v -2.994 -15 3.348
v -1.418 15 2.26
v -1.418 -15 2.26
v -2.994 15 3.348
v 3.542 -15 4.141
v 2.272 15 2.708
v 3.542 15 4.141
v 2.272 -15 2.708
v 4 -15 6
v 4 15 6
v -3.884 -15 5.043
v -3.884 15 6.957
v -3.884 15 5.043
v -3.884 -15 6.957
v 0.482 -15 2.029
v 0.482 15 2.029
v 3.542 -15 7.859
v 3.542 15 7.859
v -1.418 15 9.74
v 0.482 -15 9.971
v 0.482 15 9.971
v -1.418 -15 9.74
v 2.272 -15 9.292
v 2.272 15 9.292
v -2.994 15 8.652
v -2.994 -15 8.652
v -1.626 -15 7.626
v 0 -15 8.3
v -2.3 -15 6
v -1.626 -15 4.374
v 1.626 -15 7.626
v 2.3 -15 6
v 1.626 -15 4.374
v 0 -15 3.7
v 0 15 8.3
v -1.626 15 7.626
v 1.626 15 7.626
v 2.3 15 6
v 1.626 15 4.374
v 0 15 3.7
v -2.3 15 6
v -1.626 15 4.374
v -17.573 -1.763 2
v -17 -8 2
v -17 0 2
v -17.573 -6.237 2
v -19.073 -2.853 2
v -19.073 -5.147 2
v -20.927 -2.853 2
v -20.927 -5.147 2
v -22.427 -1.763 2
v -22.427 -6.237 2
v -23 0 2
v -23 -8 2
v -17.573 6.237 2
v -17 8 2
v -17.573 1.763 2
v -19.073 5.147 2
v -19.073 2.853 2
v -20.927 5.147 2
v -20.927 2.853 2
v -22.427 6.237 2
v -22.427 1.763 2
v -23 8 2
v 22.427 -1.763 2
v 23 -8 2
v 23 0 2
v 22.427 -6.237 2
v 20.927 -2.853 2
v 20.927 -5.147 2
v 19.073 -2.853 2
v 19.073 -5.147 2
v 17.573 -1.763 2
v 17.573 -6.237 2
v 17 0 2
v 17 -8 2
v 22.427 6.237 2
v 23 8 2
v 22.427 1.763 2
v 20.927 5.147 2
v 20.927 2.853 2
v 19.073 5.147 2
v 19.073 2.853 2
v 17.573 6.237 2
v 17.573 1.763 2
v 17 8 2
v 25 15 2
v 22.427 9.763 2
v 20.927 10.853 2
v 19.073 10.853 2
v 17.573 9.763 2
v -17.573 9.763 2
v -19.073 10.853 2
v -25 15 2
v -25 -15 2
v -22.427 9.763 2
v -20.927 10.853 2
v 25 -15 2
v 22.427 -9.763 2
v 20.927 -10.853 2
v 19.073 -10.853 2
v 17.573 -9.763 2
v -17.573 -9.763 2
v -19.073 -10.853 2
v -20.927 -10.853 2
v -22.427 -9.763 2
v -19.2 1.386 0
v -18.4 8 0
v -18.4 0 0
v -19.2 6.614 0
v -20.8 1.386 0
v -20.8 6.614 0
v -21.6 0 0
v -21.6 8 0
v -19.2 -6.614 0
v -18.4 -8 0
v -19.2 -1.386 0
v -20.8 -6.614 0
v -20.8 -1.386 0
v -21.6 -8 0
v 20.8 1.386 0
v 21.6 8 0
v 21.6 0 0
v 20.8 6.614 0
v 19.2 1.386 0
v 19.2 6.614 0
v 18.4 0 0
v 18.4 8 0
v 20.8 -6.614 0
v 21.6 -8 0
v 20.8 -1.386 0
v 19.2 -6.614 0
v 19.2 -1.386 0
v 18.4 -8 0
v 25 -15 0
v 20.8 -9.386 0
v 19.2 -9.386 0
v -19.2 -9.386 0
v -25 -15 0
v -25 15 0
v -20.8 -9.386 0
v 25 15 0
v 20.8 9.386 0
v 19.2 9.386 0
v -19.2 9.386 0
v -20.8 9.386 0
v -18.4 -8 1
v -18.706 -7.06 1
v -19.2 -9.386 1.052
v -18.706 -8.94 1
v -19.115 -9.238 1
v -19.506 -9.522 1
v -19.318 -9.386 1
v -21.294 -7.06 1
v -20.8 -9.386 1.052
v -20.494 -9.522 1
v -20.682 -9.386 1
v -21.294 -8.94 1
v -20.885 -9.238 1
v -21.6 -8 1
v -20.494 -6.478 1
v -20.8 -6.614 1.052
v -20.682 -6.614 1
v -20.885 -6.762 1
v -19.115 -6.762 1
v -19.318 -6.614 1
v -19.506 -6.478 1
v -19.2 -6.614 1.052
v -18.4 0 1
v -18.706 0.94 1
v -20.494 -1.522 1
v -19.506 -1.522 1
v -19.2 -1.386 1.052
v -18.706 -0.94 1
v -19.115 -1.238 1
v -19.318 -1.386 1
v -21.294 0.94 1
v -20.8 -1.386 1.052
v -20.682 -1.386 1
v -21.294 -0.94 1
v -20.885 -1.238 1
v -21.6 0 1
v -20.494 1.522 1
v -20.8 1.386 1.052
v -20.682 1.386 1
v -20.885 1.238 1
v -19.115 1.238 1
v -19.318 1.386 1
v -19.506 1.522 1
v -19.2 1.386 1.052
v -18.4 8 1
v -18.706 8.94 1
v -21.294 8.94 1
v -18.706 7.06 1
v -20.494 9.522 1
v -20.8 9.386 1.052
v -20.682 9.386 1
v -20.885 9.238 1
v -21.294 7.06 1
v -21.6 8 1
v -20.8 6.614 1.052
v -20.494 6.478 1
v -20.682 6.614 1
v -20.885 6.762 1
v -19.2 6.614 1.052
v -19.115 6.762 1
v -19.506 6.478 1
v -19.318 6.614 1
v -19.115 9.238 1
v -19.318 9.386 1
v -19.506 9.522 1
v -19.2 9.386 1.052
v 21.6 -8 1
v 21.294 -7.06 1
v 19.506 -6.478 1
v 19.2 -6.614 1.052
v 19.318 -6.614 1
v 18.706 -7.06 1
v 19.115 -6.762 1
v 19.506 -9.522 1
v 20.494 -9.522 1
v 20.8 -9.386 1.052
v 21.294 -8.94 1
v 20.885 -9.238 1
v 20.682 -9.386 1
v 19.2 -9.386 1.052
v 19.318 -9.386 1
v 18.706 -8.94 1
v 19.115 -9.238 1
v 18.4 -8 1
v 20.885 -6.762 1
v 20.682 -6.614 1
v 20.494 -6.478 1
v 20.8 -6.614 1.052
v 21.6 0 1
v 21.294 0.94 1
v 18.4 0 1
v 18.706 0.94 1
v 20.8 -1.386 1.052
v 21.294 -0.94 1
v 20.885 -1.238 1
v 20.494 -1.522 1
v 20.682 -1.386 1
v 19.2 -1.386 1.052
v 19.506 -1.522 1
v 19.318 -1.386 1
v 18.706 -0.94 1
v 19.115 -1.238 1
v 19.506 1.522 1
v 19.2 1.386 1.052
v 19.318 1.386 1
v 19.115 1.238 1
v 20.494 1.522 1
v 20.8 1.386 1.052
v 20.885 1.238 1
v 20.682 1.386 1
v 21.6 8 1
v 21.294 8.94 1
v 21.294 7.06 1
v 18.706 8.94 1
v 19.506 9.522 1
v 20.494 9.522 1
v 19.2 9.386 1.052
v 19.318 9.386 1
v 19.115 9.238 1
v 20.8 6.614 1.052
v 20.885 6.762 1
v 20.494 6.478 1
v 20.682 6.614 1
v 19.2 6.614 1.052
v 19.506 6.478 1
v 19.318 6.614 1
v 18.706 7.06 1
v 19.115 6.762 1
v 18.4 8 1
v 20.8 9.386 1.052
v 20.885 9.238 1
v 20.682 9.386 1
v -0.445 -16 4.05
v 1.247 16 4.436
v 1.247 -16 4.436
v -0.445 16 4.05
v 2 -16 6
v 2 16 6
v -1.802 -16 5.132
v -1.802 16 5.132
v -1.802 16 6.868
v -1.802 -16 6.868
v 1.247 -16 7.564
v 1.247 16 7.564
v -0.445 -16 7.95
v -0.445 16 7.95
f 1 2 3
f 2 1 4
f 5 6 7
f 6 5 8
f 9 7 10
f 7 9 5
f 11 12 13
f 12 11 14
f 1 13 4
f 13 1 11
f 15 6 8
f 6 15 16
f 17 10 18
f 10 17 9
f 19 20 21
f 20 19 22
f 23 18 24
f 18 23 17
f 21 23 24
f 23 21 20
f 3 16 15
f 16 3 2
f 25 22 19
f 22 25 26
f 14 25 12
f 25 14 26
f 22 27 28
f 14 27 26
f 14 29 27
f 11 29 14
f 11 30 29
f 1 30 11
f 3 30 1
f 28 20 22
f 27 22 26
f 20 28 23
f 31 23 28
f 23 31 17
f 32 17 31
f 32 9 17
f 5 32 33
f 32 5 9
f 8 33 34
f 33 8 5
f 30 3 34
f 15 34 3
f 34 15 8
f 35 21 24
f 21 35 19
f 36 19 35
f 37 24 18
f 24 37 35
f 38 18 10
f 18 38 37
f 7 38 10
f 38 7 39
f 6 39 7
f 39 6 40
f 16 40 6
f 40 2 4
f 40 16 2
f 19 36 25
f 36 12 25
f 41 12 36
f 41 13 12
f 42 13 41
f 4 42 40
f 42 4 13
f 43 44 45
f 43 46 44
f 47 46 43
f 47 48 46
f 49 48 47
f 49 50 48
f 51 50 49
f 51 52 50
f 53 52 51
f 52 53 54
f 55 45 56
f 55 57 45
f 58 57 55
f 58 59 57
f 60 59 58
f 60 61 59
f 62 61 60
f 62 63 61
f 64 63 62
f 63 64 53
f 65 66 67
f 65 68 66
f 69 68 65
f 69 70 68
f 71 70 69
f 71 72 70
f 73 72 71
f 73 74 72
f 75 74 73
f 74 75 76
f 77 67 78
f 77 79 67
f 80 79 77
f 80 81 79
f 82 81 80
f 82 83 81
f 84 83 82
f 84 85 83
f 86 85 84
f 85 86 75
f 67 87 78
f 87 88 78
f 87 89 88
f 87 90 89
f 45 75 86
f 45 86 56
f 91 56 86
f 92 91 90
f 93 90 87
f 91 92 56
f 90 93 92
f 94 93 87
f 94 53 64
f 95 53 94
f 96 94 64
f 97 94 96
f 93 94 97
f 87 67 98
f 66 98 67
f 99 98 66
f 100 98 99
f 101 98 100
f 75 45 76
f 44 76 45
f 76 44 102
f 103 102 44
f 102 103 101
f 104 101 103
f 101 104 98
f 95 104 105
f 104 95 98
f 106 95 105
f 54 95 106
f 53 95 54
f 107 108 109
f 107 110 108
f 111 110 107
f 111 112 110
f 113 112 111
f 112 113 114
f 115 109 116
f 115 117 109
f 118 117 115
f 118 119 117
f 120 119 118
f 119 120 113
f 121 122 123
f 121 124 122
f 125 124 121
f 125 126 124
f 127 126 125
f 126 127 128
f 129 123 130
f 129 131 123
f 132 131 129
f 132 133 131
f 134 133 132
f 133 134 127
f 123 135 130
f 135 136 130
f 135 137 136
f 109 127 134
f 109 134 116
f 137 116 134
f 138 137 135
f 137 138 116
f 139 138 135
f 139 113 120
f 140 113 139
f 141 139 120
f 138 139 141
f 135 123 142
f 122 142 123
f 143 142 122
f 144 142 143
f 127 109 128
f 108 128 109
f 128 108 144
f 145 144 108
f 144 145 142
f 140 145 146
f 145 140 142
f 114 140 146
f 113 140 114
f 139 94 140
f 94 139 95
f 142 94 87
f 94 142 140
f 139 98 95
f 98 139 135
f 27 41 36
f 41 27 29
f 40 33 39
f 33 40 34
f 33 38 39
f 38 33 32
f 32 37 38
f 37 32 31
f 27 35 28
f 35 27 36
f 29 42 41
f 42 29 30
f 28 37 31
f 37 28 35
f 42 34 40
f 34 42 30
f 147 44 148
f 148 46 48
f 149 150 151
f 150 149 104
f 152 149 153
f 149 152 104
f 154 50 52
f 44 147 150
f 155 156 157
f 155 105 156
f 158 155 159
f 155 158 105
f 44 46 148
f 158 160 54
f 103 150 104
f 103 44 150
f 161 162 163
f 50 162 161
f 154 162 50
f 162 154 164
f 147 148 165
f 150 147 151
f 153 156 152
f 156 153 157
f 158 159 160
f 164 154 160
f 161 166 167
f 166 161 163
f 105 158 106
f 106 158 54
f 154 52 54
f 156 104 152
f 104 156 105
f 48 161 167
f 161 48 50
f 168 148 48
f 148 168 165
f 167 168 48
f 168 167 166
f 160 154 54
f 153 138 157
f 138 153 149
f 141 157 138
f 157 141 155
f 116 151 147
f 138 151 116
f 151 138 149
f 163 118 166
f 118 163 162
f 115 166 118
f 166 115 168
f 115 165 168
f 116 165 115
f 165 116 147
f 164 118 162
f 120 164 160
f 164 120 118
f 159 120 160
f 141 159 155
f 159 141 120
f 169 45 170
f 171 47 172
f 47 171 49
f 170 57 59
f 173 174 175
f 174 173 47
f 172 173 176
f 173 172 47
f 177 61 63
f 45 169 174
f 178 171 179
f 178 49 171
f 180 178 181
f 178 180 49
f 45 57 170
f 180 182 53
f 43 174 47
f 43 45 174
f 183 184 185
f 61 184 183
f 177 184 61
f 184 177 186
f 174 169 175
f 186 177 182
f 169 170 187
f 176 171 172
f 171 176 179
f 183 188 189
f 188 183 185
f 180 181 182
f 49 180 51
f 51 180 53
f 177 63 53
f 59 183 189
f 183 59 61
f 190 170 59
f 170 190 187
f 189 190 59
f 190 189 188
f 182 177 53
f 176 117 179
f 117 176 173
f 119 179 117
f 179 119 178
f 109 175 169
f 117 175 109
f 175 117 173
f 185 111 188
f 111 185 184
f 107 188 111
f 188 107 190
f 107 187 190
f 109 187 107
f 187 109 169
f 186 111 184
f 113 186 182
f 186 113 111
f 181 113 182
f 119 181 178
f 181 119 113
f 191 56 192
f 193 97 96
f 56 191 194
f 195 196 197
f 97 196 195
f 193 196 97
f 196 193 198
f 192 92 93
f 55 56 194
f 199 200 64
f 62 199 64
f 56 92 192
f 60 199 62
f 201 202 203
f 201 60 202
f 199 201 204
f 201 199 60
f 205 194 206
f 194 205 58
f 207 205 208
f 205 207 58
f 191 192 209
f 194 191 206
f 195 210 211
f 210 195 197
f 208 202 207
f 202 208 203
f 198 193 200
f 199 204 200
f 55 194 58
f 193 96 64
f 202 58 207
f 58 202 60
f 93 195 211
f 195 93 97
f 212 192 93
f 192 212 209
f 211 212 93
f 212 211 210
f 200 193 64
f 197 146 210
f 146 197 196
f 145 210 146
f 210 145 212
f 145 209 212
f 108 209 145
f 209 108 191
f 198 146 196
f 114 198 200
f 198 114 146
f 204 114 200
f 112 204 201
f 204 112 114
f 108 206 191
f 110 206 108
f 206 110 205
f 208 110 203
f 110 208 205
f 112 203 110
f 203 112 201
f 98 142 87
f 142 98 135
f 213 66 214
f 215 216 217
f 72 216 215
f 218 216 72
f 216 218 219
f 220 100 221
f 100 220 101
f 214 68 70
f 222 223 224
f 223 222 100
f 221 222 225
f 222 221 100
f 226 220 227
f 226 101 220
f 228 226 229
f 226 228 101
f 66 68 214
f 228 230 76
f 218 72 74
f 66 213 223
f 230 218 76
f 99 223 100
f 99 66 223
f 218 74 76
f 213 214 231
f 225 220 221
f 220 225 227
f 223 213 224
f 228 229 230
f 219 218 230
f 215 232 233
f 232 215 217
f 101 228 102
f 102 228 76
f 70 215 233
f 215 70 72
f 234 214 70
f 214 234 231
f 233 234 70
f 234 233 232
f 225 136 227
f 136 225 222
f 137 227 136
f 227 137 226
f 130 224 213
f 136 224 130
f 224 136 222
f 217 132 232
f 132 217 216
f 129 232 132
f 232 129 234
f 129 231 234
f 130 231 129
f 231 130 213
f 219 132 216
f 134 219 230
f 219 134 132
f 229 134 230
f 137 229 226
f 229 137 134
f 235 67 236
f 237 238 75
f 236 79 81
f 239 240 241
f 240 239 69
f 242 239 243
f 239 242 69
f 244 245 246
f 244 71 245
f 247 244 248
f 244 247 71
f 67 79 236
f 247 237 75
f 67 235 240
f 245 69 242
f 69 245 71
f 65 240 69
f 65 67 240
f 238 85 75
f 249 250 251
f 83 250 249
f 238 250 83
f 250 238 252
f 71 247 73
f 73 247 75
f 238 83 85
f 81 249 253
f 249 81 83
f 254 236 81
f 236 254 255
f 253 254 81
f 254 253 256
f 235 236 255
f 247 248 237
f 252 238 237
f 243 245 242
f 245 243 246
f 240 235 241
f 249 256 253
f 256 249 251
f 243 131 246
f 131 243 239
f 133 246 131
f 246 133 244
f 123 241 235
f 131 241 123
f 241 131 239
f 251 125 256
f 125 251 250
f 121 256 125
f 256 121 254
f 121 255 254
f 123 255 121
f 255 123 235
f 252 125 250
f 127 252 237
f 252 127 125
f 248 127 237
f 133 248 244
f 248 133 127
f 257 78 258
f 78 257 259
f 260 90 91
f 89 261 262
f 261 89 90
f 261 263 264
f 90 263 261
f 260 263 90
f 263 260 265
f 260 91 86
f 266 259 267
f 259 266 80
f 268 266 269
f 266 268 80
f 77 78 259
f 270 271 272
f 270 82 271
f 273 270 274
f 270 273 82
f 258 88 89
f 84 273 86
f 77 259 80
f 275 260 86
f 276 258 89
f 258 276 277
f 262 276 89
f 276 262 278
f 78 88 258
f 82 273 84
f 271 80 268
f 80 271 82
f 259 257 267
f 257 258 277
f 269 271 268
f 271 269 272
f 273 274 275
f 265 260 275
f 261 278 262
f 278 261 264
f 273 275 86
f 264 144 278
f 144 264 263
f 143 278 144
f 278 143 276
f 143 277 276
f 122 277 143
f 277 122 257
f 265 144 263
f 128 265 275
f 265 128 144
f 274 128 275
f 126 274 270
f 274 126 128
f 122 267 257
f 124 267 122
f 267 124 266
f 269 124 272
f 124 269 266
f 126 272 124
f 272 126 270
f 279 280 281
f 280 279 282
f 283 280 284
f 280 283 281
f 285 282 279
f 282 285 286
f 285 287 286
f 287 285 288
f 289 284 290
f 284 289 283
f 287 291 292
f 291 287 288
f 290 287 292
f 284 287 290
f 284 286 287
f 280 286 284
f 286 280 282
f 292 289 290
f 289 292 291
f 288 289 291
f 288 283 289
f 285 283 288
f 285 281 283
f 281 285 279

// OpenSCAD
// Small butt hinge in open 180° configuration

module leaf(side=1) {
  // side = -1 for left leaf, +1 for right leaf
  difference() {
    union() {
      // leaf plate
      translate([ side == 1 ? 0 : -25, -15, 0 ])
        cube([25, 30, 2]);
      // knuckle barrels (outer)
      for (ypt = side == 1 ? [-6, 6] : [-12, 0, 12]) {
        translate([0, ypt, 6])
          rotate([-90, 0, 0])
            cylinder(h=6, r=4, center=true);
      }
    }
    // knuckle barrel inner holes
    for (ypt = side == 1 ? [-6, 6] : [-12, 0, 12]) {
      translate([0, ypt, 6])
        rotate([-90, 0, 0])
          cylinder(h=6, r=2.3, center=true);
    }
    // M3 countersunk screw holes
    for (ypt = [-8, 0, 8]) {
      // countersink: 6mm dia at surface → 3.2mm dia at 1mm depth
      translate([side*20, ypt, 1])
        cylinder(h=1, r1=1.6, r2=3, center=false);
      // through hole 3.2mm dia full thickness (2mm)
      translate([side*20, ypt, 0])
        cylinder(h=2, r=1.6, center=false);
    }
  }
}

// left leaf (x<0)
leaf(-1);
// right leaf (x>0)
leaf(1);

// hinge pin
translate([0, 0, 6])
  rotate([-90, 0, 0])
    cylinder(h=32, r=2, center=true);
